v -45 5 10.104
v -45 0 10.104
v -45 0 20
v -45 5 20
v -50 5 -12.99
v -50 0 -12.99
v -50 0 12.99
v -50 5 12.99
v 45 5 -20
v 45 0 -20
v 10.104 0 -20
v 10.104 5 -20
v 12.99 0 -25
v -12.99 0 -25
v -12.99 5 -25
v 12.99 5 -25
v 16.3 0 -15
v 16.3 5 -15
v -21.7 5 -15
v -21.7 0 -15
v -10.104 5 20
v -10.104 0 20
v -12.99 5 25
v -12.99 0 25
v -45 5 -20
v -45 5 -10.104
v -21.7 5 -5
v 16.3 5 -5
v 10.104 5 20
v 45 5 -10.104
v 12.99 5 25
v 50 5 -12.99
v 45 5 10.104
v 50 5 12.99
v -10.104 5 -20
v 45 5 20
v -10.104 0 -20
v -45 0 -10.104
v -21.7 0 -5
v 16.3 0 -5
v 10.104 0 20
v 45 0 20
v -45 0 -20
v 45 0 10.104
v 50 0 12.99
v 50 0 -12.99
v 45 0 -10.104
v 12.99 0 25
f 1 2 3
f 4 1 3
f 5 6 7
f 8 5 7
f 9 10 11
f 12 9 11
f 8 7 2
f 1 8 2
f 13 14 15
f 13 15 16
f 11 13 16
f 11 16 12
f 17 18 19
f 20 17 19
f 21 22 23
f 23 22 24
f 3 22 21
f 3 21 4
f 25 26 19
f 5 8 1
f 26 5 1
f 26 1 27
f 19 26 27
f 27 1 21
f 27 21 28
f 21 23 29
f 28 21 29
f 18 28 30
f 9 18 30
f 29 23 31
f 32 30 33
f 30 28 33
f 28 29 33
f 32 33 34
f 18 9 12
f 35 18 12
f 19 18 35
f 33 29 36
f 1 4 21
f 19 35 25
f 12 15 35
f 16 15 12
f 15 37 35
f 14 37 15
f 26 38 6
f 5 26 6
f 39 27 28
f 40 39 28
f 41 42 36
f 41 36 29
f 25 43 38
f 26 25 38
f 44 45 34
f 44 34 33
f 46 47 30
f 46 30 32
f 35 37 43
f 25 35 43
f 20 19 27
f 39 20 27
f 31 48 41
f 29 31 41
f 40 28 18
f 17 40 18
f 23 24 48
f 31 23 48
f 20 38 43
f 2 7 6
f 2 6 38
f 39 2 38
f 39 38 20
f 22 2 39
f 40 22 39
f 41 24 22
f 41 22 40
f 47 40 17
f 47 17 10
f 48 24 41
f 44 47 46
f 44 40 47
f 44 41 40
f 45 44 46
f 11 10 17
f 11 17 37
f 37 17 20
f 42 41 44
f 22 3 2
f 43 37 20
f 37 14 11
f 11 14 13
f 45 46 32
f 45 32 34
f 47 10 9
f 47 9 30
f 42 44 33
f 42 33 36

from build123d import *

# Parameters (mm, degrees)
SKETCH2_W           = 90
SKETCH2_H           = 40
BOSS_EXTRUDE1_DEPTH = 5
CUT_EXTRUDE1_DEPTH  = 10


with BuildPart() as part:
    # Sketch2 → Boss-Extrude1 (new body)
    with BuildSketch(Plane(origin=(0, 0, 0), x_dir=(-1, 0, 0), z_dir=(0, 1, 0))):
        Polygon((-50, -12.990381057), (-50, 12.990381057), (-27.5, 0), align=None)
        Rectangle(SKETCH2_W, SKETCH2_H)
        Polygon((50, 12.990381057), (27.5, 0), (50, -12.990381057), align=None)
        Polygon((12.990381057, 25), (-12.990381057, 25), (0, 2.5), align=None)
        Polygon((0, -2.5), (12.990381057, -25), (-12.990381057, -25), align=None)
    extrude(amount=BOSS_EXTRUDE1_DEPTH)

    # Sketch3 → Cut-Extrude1 (cut)
    with BuildSketch(Plane(origin=(0, 5, 0), x_dir=(-1, 0, 0), z_dir=(0, 1, 0))):
        Polygon((-16.3, -7.529573217), (-16.3, -15), (21.7, -15), (21.7, -5), (-16.3, -5), align=None)
    extrude(amount=-CUT_EXTRUDE1_DEPTH, mode=Mode.SUBTRACT)


solid = part.part
